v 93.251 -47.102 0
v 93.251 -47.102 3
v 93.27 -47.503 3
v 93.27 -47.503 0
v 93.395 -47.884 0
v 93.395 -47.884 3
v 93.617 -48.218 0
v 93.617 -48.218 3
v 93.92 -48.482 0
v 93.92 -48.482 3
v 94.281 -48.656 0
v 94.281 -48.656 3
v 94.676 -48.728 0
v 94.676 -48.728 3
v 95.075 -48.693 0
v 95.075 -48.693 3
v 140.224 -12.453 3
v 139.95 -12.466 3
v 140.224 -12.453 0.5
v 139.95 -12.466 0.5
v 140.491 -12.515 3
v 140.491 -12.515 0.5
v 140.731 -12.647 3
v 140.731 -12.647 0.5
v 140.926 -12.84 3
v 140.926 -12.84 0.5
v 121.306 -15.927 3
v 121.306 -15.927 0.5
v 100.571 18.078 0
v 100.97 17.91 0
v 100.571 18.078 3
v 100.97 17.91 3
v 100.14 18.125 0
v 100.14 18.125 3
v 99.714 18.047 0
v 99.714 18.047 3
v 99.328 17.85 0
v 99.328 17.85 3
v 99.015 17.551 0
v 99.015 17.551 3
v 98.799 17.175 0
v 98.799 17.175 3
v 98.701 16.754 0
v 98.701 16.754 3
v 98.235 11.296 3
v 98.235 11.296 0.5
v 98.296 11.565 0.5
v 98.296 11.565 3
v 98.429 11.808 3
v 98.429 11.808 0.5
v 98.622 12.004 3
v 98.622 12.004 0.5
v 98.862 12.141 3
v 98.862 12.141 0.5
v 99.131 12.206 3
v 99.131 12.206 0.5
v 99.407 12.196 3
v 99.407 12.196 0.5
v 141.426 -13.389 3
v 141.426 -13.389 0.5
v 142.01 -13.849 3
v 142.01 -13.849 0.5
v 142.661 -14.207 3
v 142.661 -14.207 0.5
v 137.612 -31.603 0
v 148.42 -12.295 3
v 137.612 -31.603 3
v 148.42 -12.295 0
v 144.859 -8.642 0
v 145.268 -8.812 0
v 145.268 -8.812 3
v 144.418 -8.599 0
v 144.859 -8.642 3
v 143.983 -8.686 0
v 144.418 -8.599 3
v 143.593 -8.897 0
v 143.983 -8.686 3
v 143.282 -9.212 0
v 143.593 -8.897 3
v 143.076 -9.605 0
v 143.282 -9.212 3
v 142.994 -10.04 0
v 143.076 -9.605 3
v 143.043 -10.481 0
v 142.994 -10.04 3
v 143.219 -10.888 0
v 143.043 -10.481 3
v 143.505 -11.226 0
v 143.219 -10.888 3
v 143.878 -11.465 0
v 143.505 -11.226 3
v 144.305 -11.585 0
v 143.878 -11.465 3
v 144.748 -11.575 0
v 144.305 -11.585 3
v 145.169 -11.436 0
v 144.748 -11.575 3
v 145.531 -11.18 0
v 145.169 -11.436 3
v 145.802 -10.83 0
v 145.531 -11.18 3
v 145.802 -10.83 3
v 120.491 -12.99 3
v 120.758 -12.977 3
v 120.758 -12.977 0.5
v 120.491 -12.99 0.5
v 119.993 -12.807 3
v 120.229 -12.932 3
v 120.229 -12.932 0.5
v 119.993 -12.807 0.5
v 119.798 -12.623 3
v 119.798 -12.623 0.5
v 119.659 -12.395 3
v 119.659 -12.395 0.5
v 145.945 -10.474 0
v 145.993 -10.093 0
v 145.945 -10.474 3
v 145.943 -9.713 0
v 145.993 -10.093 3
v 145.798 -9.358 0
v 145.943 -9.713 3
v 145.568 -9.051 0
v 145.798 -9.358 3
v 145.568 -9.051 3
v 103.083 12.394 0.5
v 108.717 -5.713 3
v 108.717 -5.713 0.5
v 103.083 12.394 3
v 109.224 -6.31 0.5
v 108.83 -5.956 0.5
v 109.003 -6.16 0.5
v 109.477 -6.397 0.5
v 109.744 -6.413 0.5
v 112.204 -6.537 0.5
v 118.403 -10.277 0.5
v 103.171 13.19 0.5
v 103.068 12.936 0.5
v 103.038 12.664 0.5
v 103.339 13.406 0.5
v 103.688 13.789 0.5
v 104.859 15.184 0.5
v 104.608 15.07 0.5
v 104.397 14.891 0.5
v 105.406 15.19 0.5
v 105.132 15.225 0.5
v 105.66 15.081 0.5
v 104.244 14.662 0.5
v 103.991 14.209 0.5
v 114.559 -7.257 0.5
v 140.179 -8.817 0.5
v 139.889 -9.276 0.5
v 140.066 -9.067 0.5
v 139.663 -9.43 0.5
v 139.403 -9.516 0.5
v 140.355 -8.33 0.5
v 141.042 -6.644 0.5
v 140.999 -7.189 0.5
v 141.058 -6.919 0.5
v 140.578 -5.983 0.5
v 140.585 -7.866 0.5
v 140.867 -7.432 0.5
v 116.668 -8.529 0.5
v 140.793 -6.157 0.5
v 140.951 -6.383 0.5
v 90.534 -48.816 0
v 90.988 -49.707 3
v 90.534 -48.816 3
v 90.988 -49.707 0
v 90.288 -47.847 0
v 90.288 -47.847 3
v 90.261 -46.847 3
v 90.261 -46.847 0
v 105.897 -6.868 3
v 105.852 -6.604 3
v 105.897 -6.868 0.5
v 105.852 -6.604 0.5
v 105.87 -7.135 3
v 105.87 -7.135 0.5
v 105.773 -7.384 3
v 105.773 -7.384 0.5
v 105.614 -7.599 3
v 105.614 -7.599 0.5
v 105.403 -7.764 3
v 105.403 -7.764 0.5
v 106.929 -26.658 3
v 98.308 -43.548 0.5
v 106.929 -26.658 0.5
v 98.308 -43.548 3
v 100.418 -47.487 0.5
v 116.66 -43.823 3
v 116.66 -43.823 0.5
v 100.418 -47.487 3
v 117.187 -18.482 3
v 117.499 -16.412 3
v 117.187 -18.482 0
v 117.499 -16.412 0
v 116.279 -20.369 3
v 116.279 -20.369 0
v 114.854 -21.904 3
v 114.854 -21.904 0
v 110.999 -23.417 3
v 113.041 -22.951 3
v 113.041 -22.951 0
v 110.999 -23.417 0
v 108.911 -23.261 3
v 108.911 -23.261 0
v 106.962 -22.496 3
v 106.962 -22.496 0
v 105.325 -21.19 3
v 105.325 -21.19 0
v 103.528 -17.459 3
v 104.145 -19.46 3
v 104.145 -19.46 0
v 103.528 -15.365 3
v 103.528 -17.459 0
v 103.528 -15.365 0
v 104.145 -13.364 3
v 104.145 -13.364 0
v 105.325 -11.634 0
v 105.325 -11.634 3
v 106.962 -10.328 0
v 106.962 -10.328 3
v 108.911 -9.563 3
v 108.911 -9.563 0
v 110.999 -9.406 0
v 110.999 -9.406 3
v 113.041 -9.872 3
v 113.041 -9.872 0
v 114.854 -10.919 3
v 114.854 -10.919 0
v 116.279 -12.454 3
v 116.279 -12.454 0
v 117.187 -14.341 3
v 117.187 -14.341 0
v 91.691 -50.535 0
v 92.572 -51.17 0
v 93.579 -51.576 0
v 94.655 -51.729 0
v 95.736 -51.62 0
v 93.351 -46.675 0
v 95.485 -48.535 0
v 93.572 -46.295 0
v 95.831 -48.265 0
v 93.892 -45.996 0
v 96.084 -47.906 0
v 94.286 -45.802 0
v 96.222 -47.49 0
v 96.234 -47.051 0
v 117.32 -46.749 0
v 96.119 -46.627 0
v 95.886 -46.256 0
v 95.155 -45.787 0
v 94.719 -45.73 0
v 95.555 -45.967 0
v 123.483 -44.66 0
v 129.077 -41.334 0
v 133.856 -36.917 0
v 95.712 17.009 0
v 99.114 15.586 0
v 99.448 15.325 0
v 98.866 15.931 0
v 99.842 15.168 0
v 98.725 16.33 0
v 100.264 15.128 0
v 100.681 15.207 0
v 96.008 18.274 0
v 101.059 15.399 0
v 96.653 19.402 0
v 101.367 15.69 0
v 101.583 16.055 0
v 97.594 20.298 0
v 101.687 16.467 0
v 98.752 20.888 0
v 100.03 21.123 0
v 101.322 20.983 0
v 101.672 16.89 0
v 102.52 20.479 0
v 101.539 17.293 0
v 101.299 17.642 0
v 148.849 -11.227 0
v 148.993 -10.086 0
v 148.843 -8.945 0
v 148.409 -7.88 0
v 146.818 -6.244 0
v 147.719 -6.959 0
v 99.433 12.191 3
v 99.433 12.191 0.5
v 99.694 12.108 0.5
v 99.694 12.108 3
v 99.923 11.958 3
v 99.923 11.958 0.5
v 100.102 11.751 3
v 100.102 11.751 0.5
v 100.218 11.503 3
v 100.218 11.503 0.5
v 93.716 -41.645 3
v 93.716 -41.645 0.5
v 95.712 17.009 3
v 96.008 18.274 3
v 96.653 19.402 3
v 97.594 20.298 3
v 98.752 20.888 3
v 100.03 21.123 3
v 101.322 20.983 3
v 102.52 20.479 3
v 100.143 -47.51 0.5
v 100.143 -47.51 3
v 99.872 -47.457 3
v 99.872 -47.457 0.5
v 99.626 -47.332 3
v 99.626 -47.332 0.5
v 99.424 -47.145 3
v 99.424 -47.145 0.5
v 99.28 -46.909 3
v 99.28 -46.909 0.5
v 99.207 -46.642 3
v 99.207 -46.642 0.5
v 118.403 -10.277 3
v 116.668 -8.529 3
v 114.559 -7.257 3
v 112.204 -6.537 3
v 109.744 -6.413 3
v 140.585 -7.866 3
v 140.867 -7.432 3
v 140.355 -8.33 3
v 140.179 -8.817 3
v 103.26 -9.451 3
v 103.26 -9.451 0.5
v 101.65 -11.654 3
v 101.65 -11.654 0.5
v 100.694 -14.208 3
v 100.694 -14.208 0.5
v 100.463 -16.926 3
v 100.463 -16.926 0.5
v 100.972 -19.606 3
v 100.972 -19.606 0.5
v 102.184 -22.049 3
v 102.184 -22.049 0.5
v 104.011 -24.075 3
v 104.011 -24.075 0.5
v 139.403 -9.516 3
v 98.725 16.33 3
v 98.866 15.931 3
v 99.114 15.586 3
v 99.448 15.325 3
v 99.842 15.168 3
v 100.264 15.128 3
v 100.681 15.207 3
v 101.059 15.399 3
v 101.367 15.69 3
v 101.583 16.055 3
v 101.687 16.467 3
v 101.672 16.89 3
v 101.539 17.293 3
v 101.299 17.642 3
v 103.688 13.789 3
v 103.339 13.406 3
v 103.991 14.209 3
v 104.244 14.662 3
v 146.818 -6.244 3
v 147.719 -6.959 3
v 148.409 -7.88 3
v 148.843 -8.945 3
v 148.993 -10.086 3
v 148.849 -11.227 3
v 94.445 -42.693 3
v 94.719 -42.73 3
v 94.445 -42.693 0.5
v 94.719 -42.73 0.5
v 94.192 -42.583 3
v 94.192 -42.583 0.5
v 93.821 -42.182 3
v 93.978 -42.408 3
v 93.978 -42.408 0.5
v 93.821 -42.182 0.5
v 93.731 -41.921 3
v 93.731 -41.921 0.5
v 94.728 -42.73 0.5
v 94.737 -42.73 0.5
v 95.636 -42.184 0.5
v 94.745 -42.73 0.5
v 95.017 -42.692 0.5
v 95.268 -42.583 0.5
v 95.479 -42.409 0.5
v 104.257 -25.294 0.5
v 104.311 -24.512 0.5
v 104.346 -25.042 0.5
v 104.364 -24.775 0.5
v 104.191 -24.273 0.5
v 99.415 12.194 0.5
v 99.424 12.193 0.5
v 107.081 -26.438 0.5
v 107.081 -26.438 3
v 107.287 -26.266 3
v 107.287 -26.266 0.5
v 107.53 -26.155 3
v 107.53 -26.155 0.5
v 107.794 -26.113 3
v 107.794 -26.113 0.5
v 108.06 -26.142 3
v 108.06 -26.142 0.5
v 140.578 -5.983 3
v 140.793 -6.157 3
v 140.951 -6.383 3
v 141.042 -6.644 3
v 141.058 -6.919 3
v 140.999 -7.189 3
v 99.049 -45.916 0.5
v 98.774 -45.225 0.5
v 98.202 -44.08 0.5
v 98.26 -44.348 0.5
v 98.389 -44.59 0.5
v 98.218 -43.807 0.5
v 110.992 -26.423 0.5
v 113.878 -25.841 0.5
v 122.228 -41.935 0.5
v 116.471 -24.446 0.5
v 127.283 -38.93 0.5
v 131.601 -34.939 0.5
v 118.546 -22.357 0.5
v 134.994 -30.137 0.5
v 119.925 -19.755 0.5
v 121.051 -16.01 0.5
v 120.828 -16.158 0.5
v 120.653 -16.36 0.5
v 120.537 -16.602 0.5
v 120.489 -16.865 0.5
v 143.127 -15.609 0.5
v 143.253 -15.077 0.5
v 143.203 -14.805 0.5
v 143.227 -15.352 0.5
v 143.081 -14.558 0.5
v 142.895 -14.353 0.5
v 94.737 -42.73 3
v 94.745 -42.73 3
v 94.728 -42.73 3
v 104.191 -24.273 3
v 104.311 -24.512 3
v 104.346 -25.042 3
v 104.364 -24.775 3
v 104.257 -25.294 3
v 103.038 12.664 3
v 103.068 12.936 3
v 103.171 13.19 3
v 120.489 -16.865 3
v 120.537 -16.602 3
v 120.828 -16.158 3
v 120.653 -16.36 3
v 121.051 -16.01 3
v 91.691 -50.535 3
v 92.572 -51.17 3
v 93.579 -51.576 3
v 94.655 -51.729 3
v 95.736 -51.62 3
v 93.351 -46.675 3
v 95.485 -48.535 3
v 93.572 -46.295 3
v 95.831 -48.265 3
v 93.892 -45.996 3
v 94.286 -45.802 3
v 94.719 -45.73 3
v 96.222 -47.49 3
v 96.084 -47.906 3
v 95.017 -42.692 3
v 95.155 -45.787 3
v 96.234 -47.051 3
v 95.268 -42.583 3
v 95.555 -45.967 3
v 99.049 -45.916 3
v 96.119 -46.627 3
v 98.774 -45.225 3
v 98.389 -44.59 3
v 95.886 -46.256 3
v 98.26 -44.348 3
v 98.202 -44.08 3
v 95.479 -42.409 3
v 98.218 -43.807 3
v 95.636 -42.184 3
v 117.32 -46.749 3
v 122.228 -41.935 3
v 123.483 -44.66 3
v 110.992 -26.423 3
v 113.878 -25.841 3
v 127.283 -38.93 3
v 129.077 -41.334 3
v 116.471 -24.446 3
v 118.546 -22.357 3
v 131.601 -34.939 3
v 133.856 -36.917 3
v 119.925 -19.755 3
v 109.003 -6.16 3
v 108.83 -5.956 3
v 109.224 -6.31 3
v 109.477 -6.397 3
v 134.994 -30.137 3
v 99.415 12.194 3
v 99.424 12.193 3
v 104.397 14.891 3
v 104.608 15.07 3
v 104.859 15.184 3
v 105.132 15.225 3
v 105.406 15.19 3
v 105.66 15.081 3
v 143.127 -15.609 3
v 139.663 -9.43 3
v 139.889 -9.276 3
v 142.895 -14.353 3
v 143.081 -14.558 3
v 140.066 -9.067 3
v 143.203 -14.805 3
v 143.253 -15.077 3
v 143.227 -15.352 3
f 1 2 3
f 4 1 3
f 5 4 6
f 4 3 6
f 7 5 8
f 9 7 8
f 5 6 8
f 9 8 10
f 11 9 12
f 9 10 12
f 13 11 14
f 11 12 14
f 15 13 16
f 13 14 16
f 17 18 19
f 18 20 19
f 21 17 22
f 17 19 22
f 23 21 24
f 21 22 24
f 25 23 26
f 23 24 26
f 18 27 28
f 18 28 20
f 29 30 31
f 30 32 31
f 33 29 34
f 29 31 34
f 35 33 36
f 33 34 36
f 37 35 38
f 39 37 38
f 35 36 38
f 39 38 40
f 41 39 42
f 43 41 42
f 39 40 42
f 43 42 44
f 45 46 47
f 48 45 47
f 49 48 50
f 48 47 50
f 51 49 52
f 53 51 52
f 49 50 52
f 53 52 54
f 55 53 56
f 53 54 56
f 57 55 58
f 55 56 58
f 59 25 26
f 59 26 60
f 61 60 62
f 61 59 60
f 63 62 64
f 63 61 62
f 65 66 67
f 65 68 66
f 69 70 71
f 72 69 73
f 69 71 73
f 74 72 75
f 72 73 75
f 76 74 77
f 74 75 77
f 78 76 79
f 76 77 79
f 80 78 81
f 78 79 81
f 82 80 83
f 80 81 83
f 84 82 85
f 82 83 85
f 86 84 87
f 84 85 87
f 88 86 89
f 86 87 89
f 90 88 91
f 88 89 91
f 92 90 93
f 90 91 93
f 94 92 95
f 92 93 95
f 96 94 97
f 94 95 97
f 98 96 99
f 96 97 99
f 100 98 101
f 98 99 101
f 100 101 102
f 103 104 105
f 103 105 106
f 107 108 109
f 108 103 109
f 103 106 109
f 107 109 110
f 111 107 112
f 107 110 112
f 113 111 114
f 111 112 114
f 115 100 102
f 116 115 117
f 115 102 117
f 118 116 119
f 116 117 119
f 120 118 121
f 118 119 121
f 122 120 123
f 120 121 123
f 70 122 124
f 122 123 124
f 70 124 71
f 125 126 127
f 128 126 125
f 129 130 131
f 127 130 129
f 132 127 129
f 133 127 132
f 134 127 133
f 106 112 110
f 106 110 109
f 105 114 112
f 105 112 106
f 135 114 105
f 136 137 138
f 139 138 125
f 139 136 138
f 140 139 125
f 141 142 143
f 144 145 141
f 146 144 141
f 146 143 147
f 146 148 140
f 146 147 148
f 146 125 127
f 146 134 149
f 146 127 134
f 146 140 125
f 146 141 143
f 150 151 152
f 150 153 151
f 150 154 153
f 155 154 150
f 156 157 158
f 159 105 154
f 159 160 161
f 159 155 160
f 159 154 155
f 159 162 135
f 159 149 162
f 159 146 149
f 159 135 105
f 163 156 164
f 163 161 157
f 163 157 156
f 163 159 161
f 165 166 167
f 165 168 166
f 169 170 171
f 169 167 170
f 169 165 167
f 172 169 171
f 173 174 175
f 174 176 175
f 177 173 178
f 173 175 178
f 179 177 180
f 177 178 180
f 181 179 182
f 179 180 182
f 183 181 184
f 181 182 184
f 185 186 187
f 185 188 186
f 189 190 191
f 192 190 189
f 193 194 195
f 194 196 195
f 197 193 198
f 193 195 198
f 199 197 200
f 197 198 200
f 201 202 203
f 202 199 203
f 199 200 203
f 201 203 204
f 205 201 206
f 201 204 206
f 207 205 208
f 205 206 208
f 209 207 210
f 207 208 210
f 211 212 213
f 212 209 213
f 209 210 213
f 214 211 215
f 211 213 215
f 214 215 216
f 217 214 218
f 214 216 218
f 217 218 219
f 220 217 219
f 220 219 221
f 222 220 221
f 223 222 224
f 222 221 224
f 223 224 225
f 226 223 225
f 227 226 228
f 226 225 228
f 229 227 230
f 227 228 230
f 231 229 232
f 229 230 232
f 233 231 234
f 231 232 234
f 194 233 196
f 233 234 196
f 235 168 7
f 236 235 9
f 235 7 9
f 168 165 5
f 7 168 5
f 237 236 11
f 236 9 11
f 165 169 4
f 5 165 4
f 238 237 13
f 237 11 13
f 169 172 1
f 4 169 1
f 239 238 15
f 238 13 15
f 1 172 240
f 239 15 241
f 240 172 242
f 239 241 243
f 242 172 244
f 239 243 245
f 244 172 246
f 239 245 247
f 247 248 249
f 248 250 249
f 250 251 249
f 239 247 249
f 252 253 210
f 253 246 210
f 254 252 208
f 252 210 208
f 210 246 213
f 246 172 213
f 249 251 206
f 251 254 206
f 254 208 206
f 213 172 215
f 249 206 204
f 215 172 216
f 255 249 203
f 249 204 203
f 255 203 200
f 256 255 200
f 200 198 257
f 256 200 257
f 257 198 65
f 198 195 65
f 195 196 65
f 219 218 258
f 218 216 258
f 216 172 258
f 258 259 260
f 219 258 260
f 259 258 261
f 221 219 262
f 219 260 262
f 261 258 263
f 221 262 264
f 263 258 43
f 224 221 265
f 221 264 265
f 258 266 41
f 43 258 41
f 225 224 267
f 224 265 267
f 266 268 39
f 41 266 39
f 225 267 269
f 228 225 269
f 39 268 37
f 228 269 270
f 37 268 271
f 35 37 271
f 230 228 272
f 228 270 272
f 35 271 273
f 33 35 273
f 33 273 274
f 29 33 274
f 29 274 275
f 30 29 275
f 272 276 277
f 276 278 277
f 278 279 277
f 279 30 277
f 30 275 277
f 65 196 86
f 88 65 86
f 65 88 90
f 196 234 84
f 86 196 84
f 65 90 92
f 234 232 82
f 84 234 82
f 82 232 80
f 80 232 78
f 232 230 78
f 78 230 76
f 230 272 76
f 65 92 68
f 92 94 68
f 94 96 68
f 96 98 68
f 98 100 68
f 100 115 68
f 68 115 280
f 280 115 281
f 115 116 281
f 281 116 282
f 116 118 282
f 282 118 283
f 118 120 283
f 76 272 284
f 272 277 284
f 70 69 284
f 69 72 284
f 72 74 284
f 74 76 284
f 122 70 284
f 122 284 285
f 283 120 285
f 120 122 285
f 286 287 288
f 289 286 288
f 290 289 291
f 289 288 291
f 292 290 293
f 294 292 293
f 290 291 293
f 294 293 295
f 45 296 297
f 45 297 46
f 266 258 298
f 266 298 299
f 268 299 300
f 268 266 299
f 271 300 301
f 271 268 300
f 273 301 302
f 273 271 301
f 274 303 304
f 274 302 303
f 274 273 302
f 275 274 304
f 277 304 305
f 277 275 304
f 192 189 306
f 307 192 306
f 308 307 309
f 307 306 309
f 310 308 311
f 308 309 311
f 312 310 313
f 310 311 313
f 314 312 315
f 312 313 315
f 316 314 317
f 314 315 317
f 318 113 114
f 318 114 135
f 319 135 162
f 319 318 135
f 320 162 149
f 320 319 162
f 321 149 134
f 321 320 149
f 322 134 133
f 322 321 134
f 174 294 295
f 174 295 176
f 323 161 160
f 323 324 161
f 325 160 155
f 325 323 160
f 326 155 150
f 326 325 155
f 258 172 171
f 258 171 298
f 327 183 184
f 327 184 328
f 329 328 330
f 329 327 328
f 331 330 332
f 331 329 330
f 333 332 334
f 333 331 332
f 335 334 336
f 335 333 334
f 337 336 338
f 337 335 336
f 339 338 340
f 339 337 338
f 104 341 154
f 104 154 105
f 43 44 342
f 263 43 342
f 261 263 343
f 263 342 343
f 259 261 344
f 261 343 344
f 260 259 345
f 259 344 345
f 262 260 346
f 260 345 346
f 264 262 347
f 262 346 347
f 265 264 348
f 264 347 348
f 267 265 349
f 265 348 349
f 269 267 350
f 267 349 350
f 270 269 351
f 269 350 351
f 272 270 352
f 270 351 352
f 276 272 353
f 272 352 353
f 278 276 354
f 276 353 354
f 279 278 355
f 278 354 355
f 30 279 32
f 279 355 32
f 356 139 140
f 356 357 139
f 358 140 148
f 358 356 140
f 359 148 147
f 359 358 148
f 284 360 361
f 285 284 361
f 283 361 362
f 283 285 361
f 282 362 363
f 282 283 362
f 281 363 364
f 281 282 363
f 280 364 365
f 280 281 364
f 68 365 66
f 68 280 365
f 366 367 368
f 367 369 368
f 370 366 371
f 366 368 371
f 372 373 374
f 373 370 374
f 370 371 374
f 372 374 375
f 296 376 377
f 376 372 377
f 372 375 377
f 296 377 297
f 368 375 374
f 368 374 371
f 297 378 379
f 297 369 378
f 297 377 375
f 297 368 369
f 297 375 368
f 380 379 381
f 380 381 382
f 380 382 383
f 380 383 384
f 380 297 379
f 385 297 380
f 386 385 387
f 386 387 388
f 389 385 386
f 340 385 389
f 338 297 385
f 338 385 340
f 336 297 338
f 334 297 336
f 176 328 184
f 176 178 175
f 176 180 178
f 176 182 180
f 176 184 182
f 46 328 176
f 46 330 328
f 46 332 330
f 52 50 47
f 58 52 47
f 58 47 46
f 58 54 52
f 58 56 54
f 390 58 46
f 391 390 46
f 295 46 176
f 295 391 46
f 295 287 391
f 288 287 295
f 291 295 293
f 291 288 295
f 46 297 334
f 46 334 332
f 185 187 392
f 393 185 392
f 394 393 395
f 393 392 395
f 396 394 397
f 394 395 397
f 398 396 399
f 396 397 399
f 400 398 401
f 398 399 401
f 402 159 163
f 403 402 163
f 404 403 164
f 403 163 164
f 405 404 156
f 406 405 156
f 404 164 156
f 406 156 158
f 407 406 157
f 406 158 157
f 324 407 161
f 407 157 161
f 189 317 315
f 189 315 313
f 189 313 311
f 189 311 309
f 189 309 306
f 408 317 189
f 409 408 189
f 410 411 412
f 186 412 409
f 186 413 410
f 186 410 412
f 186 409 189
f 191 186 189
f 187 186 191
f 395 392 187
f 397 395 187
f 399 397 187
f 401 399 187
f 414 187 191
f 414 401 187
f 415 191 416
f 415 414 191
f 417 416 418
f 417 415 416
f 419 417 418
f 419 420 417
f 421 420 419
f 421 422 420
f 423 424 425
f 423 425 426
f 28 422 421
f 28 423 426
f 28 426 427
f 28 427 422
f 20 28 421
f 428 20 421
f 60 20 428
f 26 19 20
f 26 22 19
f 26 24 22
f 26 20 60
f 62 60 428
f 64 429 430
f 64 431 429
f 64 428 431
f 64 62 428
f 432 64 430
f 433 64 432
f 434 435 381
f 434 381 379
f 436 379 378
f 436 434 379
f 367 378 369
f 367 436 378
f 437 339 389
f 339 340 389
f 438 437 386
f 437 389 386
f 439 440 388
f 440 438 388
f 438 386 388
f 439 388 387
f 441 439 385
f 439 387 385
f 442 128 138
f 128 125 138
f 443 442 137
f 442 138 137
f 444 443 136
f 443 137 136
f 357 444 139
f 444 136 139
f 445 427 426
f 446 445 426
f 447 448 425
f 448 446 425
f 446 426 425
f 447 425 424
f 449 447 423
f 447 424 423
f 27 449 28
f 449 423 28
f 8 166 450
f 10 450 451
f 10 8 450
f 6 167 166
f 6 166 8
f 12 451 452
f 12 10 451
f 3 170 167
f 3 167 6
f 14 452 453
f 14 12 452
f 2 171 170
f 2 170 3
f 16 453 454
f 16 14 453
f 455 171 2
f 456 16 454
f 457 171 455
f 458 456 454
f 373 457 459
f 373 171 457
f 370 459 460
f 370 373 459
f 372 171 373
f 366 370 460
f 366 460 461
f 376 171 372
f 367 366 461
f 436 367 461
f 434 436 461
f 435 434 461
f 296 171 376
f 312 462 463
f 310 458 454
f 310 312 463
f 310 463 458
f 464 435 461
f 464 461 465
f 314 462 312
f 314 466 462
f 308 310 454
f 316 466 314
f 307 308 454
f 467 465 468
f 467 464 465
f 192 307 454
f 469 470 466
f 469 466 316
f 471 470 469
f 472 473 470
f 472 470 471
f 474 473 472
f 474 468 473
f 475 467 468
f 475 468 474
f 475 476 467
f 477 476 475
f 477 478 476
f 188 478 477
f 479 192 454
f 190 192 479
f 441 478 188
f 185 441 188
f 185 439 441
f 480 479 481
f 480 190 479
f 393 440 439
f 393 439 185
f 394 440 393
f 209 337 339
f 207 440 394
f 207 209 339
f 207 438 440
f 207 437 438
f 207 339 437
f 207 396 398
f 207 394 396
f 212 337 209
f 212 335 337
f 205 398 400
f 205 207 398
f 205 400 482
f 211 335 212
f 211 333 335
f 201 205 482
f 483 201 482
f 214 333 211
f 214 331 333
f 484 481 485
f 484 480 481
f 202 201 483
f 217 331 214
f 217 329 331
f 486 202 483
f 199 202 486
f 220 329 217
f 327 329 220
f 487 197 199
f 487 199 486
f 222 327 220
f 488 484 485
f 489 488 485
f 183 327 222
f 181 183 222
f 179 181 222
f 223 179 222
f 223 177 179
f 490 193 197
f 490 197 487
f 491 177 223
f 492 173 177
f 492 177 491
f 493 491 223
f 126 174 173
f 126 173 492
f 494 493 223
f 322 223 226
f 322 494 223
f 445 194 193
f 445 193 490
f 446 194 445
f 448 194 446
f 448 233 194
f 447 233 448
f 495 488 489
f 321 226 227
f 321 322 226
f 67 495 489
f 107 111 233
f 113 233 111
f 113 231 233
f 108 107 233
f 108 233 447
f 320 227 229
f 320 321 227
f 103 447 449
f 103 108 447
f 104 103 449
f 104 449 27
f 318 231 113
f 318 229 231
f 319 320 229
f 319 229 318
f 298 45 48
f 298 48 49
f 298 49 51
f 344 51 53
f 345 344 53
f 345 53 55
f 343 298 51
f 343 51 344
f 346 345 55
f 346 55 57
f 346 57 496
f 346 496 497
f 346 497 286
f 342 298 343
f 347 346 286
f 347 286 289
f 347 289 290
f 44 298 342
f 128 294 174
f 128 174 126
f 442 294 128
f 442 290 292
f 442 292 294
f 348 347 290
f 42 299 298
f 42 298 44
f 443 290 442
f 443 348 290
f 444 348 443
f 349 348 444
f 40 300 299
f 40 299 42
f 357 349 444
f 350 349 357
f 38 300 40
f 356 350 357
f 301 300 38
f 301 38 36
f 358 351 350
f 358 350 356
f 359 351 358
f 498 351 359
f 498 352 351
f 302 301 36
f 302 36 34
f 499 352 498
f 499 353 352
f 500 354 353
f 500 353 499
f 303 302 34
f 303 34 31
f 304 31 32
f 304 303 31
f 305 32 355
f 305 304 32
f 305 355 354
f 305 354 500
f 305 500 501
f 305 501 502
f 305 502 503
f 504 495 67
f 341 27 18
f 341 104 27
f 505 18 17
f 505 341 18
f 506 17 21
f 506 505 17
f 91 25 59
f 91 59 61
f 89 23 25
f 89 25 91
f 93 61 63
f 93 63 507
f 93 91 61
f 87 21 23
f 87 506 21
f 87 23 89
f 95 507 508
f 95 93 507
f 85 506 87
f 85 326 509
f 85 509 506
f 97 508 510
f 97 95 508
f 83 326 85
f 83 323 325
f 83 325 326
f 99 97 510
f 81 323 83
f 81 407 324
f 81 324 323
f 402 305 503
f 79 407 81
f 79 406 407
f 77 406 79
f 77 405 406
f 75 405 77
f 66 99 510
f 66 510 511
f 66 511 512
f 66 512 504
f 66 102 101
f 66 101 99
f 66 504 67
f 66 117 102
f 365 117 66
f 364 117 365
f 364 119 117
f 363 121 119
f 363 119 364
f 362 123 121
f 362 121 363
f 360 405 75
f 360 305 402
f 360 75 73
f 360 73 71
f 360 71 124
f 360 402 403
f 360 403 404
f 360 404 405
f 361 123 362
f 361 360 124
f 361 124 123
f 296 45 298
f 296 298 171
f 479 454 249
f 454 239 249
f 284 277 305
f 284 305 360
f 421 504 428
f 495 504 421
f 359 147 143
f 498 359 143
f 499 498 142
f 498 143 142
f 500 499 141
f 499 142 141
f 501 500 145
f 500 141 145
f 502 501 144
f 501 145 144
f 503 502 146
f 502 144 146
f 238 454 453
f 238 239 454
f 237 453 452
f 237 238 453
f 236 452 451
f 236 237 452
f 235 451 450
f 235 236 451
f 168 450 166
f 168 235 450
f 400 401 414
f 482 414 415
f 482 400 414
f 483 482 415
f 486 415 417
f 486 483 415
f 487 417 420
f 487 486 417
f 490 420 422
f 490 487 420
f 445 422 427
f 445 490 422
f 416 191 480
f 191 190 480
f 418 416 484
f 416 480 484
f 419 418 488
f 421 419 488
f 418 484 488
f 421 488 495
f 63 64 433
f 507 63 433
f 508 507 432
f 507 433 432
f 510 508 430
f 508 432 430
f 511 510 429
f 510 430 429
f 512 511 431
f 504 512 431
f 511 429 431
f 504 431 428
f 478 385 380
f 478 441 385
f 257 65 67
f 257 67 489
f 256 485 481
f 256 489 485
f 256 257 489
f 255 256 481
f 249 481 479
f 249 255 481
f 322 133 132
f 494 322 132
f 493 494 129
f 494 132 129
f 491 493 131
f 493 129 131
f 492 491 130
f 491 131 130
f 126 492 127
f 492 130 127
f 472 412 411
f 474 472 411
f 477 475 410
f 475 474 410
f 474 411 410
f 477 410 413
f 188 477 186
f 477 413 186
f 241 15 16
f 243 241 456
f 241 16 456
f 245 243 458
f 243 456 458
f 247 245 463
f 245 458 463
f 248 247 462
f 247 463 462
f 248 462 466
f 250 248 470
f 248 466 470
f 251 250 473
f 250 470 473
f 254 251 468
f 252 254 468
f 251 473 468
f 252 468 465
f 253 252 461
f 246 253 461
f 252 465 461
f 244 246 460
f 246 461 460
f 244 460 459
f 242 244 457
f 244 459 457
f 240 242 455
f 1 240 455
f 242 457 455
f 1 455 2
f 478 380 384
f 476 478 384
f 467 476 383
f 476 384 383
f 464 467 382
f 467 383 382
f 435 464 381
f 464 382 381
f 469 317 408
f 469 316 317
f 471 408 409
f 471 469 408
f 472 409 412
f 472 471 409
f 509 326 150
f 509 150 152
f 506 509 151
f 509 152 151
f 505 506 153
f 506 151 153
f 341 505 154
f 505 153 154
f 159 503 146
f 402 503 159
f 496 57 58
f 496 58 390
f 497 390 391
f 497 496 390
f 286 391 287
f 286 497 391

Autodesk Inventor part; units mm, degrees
ref_plane "YZ Plane" through (0, 0, 0) normal (1, 0, 0) x (0, 1, 0)
ref_plane "XZ Plane" through (0, 0, 0) normal (0, 1, 0) x (-1, 0, 0)
ref_plane "XY Plane" through (0, 0, 0) normal (0, 0, 1) x (1, 0, 0)
sketch "スケッチ1" plane through (0, 0, 0) normal (0, 0, 1) x (1, 0, 0)
  circle A0 centre (110.4743, -16.4118) radius 30.1 construction
  circle A1 centre (150.4743, 0.5882) radius 1.5
  circle A2 centre (127.6431, 30.2622) radius 1.5
  circle A3 centre (80.4743, 23.124) radius 1.5
  circle A4 centre (70.4743, -10.4118) radius 1.5
  circle A5 centre (110.4743, -16.4118) radius 7.025
  arc A6 (79.801, 27.5733) -> (76.162, 24.4099) centre (80.4743, 23.124) ccw
  arc A7 (131.2097, 33.0062) -> (126.9698, 34.7115) centre (127.6431, 30.2622) ccw
  arc A8 (154.401, -1.6098) -> (154.0408, 3.3323) centre (150.4743, 0.5882) ccw
  arc A9 (66.162, -9.1259) -> (66.7172, -12.8885) centre (70.4743, -10.4118) ccw
  arc A10 (117.3199, -46.749) -> (137.6119, -31.6026) centre (110.4743, -16.4118) ccw
  line L0 (154.401, -1.6098) -> (137.6119, -31.6026)
  line L1 (66.162, -9.1259) -> (76.162, 24.4099)
  line L2 (79.801, 27.5733) -> (126.9698, 34.7115)
  line L3 (131.2097, 33.0062) -> (154.0408, 3.3323)
  line L4 (96.5433, 16.3458) -> (118.2214, -10.0492) construction
  line L5 (117.0311, -23.9953) -> (91.1935, -46.3348) construction
  circle A11 centre (100.1953, 16.6261) radius 3 construction
  circle A12 centre (144.4932, -10.0968) radius 3 construction
  circle A13 centre (100.1953, 16.6261) radius 4.5 construction
  circle A14 centre (144.4932, -10.0968) radius 4.5 construction
  arc A15 (90.988, -49.7066) -> (95.7356, -51.6195) centre (94.7451, -47.2298) ccw
  circle A16 centre (94.7451, -47.2298) radius 3 construction
  line L6 (95.7356, -51.6195) -> (117.3199, -46.749)
  line L7 (66.7172, -12.8885) -> (90.988, -49.7066)
  circle A17 centre (100.1953, 16.6261) radius 1.25
  circle A18 centre (144.4932, -10.0968) radius 1.25
  circle A19 centre (94.7451, -47.2298) radius 1.25
  point P0 (0, 0)
  point P1 (0, 0)
  point P2 (0, 0)
  dimension "d0" = 14.05
  dimension "d1" = 9
  dimension "d2" = 9
  dimension "d3" = 9
  dimension "d4" = 9
  dimension "d5" = 1
  dimension "d6" = 6
  dimension "d7" = 6
  dimension "d8" = 9
  dimension "d9" = 9
  dimension "d10" = 9
  dimension "d11" = 6
  dimension "d12" = 2.5
  dimension "d13" = 2.5
  dimension "d14" = 2.5
sketch "スケッチ2" plane through (0, 0, 0) normal (0, 0, 1) x (1, 0, 0)
  circle A0 centre (100.1953, 16.6261) radius 1.25 projected
  circle A1 centre (144.4932, -10.0968) radius 1.25 projected
  circle A2 centre (94.7451, -47.2298) radius 1.25 projected
  line L0 (95.7356, -51.6195) -> (117.3199, -46.749) projected
  arc A3 (117.3199, -46.749) -> (137.6119, -31.6026) centre (110.4743, -16.4118) ccw projected
  line L1 (154.401, -1.6098) -> (137.6119, -31.6026) projected
  arc A4 (90.988, -49.7066) -> (95.7356, -51.6195) centre (94.7451, -47.2298) ccw projected
  arc A5 (102.5197, 20.4792) -> (95.7116, 17.0088) centre (100.1953, 16.6261) ccw
  arc A6 (148.4198, -12.2949) -> (146.8176, -6.2437) centre (144.4932, -10.0968) ccw
  line L2 (148.4198, -12.2949) -> (137.6119, -31.6026)
  arc A7 (90.2614, -46.8472) -> (90.988, -49.7066) centre (94.7451, -47.2298) ccw
  line L3 (90.2614, -46.8472) -> (95.7116, 17.0088)
  line L4 (102.5197, 20.4792) -> (146.8176, -6.2437)
  circle A8 centre (110.4743, -16.4118) radius 7.025 projected
  point P0 (0, 0)
  dimension "d15" = 9
  dimension "d16" = 9
extrude "押し出し1" add sketch "スケッチ2" along normal blind 3
sketch "スケッチ3" plane through (0, 0, 3) normal (0, 0, 1) x (1, 0, 0)
  circle A0 centre (110.4743, -16.4118) radius 7.025 projected
  circle A1 centre (94.7451, -47.2298) radius 1.25 projected
  circle A2 centre (144.4932, -10.0968) radius 1.25 projected
  circle A3 centre (100.1953, 16.6261) radius 1.25 projected
  line L0 (95.7356, -51.6195) -> (117.3199, -46.749) projected
  arc A4 (117.3199, -46.749) -> (137.6119, -31.6026) centre (110.4743, -16.4118) ccw projected
  line L1 (137.6119, -31.6026) -> (148.4198, -12.2949) projected
  arc A5 (148.4198, -12.2949) -> (146.8176, -6.2437) centre (144.4932, -10.0968) ccw projected
  line L2 (146.8176, -6.2437) -> (102.5197, 20.4792) projected
  arc A6 (102.5197, 20.4792) -> (95.7116, 17.0088) centre (100.1953, 16.6261) ccw projected
  line L3 (95.7116, 17.0088) -> (90.2614, -46.8472) projected
  arc A7 (90.2614, -46.8472) -> (95.7356, -51.6195) centre (94.7451, -47.2298) ccw projected
  line L4 (100.9701, 17.9105) -> (145.268, -8.8124)
  arc A8 (145.8021, -10.8295) -> (145.268, -8.8124) centre (144.4932, -10.0968) ccw
  line L5 (145.8021, -10.8295) -> (134.9942, -30.1373)
  arc A9 (116.6595, -43.8226) -> (134.9942, -30.1373) centre (110.4743, -16.4118) ccw
  line L6 (116.6595, -43.8226) -> (95.0753, -48.6931)
  arc A10 (93.2506, -47.1023) -> (95.0753, -48.6931) centre (94.7451, -47.2298) ccw
  line L7 (93.2506, -47.1023) -> (98.7007, 16.7536)
  arc A11 (100.9701, 17.9105) -> (98.7007, 16.7536) centre (100.1953, 16.6261) ccw
  circle A12 centre (110.4743, -16.4118) radius 10.025
  arc A13 (98.3399, 12.5264) -> (104.6029, 15.719) centre (100.1953, 16.6261) ccw
  circle A14 centre (144.4932, -10.0968) radius 1.25 projected
  arc A15 (141.6352, -6.6209) -> (143.7297, -14.5316) centre (144.4932, -10.0968) ccw
  arc A16 (99.2139, -47.7592) -> (93.6114, -42.875) centre (94.7451, -47.2298) ccw
  circle A17 centre (94.7451, -47.2298) radius 1.5
  circle A18 centre (144.4932, -10.0968) radius 1.5
  circle A19 centre (100.1953, 16.6261) radius 1.5
  line L8 (110.4743, -16.4118) -> (144.4932, -10.0968) construction
  arc A20 (110.2006, -14.937) -> (110.7481, -17.8866) centre (110.4743, -16.4118) ccw
  arc A21 (144.7669, -11.5716) -> (144.2194, -8.622) centre (144.4932, -10.0968) ccw
  line L9 (100.1953, 16.6261) -> (110.4743, -16.4118) construction
  arc A22 (101.6276, 17.0717) -> (98.763, 16.1804) centre (100.1953, 16.6261) ccw
  arc A23 (109.0421, -16.8574) -> (111.9066, -15.9662) centre (110.4743, -16.4118) ccw
  line L10 (110.4743, -16.4118) -> (94.7451, -47.2298) construction
  arc A24 (111.8104, -17.0937) -> (109.1383, -15.7299) centre (110.4743, -16.4118) ccw
  arc A25 (93.4091, -46.5479) -> (96.0812, -47.9118) centre (94.7451, -47.2298) ccw
  line L11 (110.7481, -17.8866) -> (117.4958, -16.634)
  line L12 (120.4938, -16.0775) -> (140.5956, -12.346)
  line L13 (140.048, -9.3964) -> (119.9462, -13.1279)
  line L14 (116.9483, -13.6844) -> (110.2006, -14.937)
  line L15 (111.9066, -15.9662) -> (109.8677, -9.413)
  line L16 (108.9619, -6.5015) -> (102.888, 13.0206)
  line L17 (100.0234, 12.1294) -> (106.0973, -7.3928)
  line L18 (107.0032, -10.3043) -> (109.0421, -16.8574)
  line L19 (109.1383, -15.7299) -> (108.8606, -16.2741)
  line L20 (104.6322, -24.5586) -> (95.3378, -42.769)
  line L21 (98.0099, -44.1329) -> (107.3043, -25.9224)
  line L22 (108.6904, -23.2065) -> (111.8104, -17.0937)
  point P0 (0, 0)
  point P1 (127.4837, -13.2543)
  point P2 (105.3348, 0.1071)
  point P3 (102.6097, -31.8208)
  dimension "d20" = 3
  dimension "d21" = 3
  dimension "d22" = 3
  dimension "d23" = 3
  dimension "d24" = 3
  dimension "d25" = 3
  dimension "d26" = 3
  dimension "d27" = 3
  dimension "d28" = 3
  dimension "d29" = 3
  dimension "d30" = 3
extrude "押し出し2" cut sketch "スケッチ3" against normal blind 2.5 contours L4 A15 L13 A12 L16 A13 | A13 L17 A12 L20 A16 L7 | A15 L5 A9 L6 A16 L21 A12 L12
extrude "押し出し3" cut sketch "スケッチ3" against normal blind 3 contours A19 A11 | A8 A18 | A17 A10
fillet "フィレット1" radius 1 18 edges at (104.6029, 15.719, 1.75) (102.888, 13.0206, 1.75) (100.0234, 12.1294, 1.75) (98.3399, 12.5264, 1.75) (106.0973, -7.3928, 1.75) (108.9619, -6.5015, 1.75) (119.9462, -13.1279, 1.75) (120.4938, -16.0775, 1.75) (107.3043, -25.9224, 1.75) (104.6322, -24.5586, 1.75) (95.3378, -42.769, 1.75) (93.6114, -42.875, 1.75) (98.0099, -44.1329, 1.75) (99.2139, -47.7592, 1.75) (143.7297, -14.5316, 1.75) (140.5956, -12.346, 1.75) (140.048, -9.3964, 1.75) (141.6352, -6.6209, 1.75)
properties part number "前足ギアトレイン抑え" material "ポリカーボネート、クリア"
